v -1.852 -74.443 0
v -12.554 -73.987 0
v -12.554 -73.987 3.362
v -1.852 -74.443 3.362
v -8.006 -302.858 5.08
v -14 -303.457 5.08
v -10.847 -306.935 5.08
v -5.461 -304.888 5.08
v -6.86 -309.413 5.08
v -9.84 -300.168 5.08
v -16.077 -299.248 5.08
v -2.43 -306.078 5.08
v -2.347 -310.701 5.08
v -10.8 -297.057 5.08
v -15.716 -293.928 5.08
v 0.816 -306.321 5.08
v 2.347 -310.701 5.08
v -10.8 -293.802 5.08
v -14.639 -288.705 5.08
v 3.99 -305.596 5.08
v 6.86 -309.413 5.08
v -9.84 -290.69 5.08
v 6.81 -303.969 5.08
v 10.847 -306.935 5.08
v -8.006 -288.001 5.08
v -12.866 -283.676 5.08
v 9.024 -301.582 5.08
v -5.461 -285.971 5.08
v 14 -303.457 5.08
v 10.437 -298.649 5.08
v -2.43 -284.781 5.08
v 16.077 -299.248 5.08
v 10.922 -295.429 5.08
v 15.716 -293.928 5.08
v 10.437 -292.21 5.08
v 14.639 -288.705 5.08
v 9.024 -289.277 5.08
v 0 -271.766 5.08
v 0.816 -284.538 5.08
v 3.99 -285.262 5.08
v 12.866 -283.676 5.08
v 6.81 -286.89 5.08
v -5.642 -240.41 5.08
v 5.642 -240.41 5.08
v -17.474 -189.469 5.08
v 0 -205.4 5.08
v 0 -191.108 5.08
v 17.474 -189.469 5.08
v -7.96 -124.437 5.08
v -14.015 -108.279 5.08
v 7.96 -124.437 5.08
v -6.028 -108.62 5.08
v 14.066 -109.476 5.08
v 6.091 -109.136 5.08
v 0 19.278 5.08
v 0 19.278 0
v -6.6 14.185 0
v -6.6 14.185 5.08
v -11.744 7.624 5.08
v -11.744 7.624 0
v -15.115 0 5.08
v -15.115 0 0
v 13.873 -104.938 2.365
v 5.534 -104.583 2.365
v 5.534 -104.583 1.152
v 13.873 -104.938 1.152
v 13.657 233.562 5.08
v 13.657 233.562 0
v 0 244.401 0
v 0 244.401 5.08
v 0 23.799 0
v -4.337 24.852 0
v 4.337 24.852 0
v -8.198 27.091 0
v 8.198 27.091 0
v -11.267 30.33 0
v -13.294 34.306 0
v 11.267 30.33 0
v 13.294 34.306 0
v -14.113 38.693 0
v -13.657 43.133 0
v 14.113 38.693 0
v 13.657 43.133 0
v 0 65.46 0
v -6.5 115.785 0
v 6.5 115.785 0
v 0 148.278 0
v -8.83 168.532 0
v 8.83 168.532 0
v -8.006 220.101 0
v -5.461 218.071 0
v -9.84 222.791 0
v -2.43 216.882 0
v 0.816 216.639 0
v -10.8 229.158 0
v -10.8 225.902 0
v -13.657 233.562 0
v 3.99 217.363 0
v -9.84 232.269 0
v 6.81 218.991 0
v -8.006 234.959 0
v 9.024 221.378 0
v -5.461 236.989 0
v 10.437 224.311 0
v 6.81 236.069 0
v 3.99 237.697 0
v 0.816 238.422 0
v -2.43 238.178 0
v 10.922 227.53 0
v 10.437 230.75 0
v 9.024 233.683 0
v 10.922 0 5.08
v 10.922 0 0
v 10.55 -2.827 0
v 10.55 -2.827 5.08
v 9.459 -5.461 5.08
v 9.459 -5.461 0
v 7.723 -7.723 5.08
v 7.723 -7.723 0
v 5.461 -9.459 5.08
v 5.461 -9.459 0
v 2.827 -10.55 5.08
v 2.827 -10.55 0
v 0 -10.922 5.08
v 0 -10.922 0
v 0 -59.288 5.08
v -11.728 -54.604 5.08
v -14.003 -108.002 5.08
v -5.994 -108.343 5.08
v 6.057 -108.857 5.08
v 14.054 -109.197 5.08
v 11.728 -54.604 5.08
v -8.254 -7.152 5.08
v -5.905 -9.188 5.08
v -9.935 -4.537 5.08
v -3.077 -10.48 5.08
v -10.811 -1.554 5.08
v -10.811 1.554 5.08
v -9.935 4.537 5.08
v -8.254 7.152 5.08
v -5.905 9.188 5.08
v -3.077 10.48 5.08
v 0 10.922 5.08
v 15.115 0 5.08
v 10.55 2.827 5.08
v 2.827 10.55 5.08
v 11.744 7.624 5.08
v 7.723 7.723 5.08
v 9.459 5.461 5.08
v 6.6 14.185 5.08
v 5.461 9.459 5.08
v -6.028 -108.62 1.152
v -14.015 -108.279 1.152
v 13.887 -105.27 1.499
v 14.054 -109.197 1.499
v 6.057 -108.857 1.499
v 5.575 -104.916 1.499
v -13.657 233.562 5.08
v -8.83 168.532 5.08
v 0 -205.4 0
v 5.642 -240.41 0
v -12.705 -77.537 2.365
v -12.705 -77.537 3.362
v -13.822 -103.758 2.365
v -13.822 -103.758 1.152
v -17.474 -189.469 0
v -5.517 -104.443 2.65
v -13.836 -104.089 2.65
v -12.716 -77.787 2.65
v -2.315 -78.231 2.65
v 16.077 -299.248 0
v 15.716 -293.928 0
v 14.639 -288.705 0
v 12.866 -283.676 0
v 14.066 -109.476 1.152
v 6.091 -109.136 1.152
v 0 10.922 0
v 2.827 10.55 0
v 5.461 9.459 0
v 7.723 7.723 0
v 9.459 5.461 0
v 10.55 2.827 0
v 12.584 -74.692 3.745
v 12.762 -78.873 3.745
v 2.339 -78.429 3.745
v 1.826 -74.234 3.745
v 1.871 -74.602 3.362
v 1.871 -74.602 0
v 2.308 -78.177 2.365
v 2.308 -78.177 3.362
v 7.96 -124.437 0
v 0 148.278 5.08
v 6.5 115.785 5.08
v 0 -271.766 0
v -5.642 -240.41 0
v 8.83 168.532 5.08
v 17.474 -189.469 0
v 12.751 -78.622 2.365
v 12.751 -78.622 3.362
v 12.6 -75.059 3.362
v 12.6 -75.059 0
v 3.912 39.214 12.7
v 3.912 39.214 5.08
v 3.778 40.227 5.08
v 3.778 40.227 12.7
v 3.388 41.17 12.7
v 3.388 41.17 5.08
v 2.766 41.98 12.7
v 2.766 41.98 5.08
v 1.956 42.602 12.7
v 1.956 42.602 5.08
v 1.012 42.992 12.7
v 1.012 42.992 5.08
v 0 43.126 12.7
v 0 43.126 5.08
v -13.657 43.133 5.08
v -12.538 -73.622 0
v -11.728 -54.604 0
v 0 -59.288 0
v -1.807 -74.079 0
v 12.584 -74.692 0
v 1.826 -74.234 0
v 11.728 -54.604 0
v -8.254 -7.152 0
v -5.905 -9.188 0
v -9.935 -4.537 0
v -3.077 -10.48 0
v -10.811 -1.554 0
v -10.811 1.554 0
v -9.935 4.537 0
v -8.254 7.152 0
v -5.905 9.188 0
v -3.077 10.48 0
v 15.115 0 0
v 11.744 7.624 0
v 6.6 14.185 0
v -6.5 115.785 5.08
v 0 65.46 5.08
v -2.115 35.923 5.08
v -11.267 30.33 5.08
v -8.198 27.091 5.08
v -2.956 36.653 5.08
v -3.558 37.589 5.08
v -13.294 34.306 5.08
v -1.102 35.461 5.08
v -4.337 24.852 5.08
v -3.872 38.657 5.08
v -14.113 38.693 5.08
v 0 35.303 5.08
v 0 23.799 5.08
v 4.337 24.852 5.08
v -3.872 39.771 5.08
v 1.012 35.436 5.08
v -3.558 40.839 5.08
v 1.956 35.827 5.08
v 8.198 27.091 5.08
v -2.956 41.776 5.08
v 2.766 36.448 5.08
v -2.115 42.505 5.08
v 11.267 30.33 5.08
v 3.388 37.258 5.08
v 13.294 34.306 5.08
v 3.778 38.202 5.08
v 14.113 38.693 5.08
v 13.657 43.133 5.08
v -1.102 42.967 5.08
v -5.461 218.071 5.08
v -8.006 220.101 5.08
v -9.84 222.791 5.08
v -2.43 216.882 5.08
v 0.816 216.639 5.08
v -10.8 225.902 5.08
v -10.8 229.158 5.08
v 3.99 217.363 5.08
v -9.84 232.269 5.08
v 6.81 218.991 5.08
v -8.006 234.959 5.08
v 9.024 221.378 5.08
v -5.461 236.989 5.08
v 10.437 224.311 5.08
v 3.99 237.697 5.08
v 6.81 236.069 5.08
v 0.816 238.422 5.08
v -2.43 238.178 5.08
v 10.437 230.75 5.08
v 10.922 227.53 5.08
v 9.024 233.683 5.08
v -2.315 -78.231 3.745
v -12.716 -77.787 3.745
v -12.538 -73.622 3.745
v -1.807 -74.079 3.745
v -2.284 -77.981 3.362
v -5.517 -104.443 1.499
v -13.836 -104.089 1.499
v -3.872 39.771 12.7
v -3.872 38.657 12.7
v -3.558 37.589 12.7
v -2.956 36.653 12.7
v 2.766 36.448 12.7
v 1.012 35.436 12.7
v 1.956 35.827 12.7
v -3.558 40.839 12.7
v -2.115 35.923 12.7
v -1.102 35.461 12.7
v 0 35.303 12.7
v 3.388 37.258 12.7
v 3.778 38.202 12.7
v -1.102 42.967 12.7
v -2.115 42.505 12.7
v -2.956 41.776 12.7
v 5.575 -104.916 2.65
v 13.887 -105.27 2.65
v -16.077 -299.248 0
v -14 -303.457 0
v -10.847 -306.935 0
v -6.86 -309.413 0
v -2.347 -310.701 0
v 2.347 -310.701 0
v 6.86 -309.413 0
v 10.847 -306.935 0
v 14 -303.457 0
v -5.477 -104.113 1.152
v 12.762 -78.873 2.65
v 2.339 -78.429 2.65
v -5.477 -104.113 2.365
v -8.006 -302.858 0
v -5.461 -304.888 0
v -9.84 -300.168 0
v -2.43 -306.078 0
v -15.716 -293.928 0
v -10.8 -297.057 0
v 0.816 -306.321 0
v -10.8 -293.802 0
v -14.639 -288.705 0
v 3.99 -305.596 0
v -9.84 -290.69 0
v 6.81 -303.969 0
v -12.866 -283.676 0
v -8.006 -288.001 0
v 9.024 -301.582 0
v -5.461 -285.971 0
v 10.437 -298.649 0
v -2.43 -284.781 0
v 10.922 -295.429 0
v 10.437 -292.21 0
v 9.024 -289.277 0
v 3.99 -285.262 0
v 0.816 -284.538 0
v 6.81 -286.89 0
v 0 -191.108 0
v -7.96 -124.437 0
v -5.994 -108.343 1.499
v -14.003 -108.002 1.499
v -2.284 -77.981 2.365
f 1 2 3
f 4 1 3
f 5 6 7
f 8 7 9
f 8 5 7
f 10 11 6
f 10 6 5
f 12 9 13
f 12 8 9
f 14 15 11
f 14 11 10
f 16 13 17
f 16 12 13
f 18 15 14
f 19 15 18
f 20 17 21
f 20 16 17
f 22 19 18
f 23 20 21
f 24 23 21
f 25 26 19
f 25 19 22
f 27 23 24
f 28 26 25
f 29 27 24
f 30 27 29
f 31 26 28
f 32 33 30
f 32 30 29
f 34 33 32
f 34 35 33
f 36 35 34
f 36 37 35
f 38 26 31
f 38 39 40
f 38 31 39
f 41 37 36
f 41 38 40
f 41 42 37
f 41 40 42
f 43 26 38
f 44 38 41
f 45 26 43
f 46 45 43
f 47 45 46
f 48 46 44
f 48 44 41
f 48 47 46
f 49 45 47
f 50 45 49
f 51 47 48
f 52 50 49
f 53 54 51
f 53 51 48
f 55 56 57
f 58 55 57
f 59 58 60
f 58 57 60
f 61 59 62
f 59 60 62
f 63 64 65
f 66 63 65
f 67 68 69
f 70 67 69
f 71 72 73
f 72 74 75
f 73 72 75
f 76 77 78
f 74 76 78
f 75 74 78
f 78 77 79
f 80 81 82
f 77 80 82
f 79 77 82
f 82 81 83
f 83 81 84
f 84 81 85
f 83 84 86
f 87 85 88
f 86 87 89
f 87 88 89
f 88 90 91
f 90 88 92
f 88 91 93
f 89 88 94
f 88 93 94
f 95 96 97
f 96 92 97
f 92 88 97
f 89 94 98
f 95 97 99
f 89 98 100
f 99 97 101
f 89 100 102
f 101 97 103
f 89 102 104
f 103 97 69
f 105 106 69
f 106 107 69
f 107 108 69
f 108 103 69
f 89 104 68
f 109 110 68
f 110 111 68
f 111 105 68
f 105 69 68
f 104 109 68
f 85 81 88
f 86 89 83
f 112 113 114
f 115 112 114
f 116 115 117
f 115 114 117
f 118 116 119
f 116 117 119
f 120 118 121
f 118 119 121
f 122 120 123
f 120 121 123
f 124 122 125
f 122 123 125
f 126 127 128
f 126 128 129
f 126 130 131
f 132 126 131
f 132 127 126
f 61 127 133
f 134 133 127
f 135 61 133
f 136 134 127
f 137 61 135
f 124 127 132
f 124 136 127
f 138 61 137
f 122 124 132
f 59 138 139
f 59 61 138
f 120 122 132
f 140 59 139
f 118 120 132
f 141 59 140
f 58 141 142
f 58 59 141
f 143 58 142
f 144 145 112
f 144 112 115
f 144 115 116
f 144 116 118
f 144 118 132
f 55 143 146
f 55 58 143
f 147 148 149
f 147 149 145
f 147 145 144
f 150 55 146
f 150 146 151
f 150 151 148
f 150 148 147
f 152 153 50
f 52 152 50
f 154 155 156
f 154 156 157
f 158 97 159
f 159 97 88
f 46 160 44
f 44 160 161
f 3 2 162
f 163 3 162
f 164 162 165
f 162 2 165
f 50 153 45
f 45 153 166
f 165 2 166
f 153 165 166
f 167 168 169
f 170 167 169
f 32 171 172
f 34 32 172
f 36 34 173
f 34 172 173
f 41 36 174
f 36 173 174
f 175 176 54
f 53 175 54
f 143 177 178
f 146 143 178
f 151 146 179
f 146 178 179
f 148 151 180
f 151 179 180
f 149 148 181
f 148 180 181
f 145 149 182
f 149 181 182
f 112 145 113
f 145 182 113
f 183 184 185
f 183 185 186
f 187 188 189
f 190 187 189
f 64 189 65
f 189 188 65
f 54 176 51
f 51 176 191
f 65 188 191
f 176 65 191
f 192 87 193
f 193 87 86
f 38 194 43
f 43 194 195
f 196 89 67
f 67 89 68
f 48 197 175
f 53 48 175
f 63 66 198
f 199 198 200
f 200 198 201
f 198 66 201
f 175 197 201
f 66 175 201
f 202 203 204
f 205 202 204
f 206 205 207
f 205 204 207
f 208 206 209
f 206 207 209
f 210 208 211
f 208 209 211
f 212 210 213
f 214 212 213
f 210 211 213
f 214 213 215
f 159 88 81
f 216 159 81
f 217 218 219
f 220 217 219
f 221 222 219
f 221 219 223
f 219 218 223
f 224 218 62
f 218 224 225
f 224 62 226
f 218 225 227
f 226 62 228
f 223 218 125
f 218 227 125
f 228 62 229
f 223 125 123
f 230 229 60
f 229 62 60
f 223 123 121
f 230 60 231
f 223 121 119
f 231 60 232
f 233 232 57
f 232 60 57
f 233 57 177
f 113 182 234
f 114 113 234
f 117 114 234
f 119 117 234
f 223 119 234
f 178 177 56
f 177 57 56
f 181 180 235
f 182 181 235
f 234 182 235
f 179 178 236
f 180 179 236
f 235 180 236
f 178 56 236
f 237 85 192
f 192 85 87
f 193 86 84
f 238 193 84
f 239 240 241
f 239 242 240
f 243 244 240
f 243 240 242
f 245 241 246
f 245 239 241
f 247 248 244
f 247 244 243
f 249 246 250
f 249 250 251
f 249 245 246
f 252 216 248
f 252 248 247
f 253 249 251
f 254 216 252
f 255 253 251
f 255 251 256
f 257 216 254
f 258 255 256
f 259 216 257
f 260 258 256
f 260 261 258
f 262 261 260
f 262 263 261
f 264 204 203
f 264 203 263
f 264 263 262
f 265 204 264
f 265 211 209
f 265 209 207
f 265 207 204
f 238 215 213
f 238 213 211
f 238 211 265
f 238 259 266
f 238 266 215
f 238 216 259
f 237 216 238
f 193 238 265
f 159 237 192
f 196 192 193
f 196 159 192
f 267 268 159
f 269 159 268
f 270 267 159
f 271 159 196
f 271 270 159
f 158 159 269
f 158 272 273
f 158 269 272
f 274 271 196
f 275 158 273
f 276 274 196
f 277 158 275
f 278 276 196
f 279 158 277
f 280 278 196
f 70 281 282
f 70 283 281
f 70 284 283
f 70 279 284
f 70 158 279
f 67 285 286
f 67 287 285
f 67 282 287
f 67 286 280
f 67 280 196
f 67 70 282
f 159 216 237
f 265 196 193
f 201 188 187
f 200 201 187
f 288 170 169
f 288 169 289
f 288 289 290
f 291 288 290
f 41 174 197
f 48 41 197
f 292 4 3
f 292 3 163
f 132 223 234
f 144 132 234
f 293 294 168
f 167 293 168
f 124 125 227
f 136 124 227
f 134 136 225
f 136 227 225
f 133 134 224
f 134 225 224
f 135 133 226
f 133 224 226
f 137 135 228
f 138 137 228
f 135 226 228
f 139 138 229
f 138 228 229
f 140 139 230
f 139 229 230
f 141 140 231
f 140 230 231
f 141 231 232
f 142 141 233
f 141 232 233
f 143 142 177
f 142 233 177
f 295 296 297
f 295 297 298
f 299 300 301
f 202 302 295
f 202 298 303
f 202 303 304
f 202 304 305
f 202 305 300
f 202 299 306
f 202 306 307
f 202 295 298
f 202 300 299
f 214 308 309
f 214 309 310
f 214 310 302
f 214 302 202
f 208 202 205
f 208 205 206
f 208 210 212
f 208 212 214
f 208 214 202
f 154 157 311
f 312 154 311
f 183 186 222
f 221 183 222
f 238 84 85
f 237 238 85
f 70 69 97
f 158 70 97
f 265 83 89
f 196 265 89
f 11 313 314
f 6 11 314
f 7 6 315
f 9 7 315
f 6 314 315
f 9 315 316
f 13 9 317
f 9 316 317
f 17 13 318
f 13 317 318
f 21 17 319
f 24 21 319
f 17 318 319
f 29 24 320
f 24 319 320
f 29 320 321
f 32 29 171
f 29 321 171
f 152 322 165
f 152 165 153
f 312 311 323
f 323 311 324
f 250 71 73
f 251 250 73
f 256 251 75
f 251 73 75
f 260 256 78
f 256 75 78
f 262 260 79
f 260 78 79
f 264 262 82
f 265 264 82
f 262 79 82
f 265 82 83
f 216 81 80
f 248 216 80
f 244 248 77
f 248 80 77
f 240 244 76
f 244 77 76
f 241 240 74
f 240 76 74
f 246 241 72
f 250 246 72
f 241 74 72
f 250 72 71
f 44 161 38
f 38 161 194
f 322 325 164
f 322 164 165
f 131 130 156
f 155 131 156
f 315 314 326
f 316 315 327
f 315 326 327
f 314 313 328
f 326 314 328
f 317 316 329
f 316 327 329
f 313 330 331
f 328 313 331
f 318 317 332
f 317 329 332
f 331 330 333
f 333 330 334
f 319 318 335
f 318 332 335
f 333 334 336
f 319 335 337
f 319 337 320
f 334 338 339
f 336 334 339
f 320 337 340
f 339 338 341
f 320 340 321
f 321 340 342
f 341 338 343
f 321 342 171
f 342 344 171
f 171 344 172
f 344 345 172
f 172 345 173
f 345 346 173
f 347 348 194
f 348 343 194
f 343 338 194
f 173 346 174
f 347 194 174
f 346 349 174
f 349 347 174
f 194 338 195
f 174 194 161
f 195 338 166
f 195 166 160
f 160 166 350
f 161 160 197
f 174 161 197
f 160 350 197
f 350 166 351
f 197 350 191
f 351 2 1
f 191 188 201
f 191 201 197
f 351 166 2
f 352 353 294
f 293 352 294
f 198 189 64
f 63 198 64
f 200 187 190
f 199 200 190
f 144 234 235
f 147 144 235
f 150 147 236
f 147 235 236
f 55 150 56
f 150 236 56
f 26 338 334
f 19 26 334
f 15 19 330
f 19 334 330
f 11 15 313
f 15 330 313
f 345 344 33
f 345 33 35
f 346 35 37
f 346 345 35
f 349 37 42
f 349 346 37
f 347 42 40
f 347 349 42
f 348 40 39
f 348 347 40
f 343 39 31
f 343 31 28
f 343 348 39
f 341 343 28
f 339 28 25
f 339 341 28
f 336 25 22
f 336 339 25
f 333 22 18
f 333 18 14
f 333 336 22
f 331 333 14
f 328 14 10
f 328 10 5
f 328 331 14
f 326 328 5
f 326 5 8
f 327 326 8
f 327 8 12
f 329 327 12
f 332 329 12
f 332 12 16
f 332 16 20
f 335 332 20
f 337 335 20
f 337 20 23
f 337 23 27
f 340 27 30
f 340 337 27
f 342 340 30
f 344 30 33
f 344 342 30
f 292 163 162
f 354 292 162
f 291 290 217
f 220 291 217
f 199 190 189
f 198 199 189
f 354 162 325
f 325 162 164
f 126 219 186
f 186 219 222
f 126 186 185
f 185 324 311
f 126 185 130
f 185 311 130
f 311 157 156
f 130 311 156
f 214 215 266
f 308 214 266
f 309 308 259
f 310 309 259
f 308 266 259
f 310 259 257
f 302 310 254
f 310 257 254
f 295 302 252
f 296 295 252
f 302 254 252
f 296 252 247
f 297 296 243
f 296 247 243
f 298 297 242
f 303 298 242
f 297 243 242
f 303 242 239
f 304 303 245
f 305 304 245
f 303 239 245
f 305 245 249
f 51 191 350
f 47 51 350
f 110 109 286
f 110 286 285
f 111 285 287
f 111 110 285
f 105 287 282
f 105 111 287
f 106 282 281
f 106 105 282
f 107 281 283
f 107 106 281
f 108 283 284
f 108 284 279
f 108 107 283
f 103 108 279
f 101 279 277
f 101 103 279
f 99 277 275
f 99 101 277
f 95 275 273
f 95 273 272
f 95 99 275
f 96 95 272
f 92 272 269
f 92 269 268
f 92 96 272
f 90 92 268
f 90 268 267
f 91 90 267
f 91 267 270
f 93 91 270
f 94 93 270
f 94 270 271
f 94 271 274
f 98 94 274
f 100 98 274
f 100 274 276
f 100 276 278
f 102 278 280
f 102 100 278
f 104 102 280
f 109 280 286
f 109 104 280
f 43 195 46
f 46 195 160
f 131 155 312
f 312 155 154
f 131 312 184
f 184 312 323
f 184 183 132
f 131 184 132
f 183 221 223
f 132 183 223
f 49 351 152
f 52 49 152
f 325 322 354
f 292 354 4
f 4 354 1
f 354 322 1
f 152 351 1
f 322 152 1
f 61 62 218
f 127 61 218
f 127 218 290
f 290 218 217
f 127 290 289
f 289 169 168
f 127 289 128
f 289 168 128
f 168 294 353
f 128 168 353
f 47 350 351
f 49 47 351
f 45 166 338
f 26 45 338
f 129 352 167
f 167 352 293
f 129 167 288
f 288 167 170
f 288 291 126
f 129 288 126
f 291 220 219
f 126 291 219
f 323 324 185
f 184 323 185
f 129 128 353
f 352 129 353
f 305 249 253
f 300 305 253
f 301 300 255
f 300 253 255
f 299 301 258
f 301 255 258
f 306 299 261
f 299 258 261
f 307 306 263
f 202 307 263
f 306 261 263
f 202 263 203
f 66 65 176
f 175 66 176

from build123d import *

# Parameters (mm, degrees)
F0_R       = 10.922
F1_DEPTH   = 5.08
F3_R       = 10.922
F4_DEPTH   = 5.08
F5_DEPTH   = 12.7
F1_FACE1_W = 134.9867132481
F1_FACE1_H = 5.08
F6_DEPTH   = 40.0849549569


with BuildPart() as f1:
    # F0 (on Top) → F1 (new body)
    with BuildSketch(Plane.XY):
        with BuildLine():
            ThreePointArc((15.1150114834, 0), (9.3757520306, 11.0647871917), (0, 19.278427586))
            ThreePointArc((0, 19.278427586), (-9.3757520306, 11.0647871917), (-15.1150114834, 0))
            Line((-15.1150114834, 0), (-11.728124693, -54.6044968069))
            Line((-11.728124693, -54.6044968069), (-17.4740906805, -189.4688606262))
            Line((-17.4740906805, -189.4688606262), (-12.8661198542, -283.6762070656))
            ThreePointArc((-12.8661198542, -283.6762070656), (-15.2657067928, -291.2982501834), (-16.0767073593, -299.2478311062))
            ThreePointArc((-16.0767073593, -299.2478311062), (0, -310.8648259444), (16.0767073593, -299.2478311062))
            ThreePointArc((16.0767073593, -299.2478311062), (15.2657067928, -291.2982501834), (12.8661198542, -283.6762070656))
            Line((12.8661198542, -283.6762070656), (17.4740906805, -189.4688606262))
            Line((17.4740906805, -189.4688606262), (11.728124693, -54.6044968069))
            Line((11.728124693, -54.6044968069), (15.1150114834, 0))
        make_face()
        with Locations((0, -295.4293489456)):
            Circle(F0_R, mode=Mode.SUBTRACT)
        Polygon((-5.6423097849, -240.4096722603), (0, -205.3996622562), (5.6423097849, -240.4096722603), (0, -271.7664837837), align=None, mode=Mode.SUBTRACT)
        Polygon((-7.9602571204, -124.4369074702), (0, -59.2878311872), (7.9602571204, -124.4369074702), (0, -191.1081522703), align=None, mode=Mode.SUBTRACT)
        with BuildLine():
            ThreePointArc((0, 10.922), (7.7230202641, 7.7230202641), (10.922, 0))
            ThreePointArc((10.922, 0), (7.7230202641, -7.7230202641), (0, -10.922))
            ThreePointArc((0, -10.922), (-10.922, 0), (0, 10.922))
        make_face(mode=Mode.SUBTRACT)
    extrude(amount=F1_DEPTH)

    # F2 (on face) + F1_face1 (on face) → F6 (cut, through all)
    with BuildSketch(Plane(origin=(-9.3846365842, 0.3998372965, 0), x_dir=(-0.0425669005, -0.9990936187, 0), z_dir=(-0.9990936187, 0.0425669005, 0))):
        Polygon((108.6390390992, 5.08), (108.5000261664, 5.08), (108.5000261664, 1.4986022143), (104.5833975077, 1.4986022143), (104.5833975077, 2.6502343826), (78.2581716776, 2.6502343826), (78.2581716776, 3.7448140793), (74.0887746215, 3.7448140793), (74.0887746215, 0), (74.304997921, 0), (74.4544714689, 0), (74.4544714689, 3.3619990572), (78.0077949166, 3.3619990572), (78.0077949166, 2.3651611991), (104.2522341013, 2.3651611991), (104.2522341013, 1.1519507971), (108.777731657, 1.1519507971), (108.777731657, 5.08), align=None)
    with BuildSketch(Plane(origin=(14.6011076868, -122.0366787165, 2.54), x_dir=(-0.0425669005, 0.9990936187, 0), z_dir=(0.9990936187, 0.0425669005, 0))):
        Rectangle(F1_FACE1_W, F1_FACE1_H)
    extrude(amount=-F6_DEPTH, dir=(-0.9990936187, 0.0425669005, 0), mode=Mode.SUBTRACT)


with BuildPart() as f4:
    # F3 (on Top) → F4 (new body)
    with BuildSketch(Plane.XY):
        with BuildLine():
            Line((-8.8296765462, 168.5318052769), (-13.6566273868, 43.1325063109))
            ThreePointArc((-13.6566273868, 43.1325063109), (-11.2673867399, 30.3300555363), (0, 23.7988065928))
            ThreePointArc((0, 23.7988065928), (11.2673867399, 30.3300555363), (13.6566273868, 43.1325063109))
            Line((13.6566273868, 43.1325063109), (8.8296765462, 168.5318052769))
            Line((8.8296765462, 168.5318052769), (13.6566273868, 233.5623651743))
            Line((13.6566273868, 233.5623651743), (0, 244.4007992744))
            Line((0, 244.4007992744), (-13.6566273868, 233.5623651743))
            Line((-13.6566273868, 233.5623651743), (-8.8296765462, 168.5318052769))
        make_face()
        with BuildLine():
            ThreePointArc((3.9116, 39.2141240993), (2.7659188853, 36.448205214), (0, 35.3025240993))
            ThreePointArc((0, 35.3025240993), (-3.9116, 39.2141240993), (0, 43.1257240993))
            ThreePointArc((0, 43.1257240993), (2.7659188853, 41.9800429846), (3.9116, 39.2141240993))
        make_face(mode=Mode.SUBTRACT)
        Polygon((6.5004709177, 115.7847344875), (0, 65.4596313834), (-6.5004709177, 115.7847344875), (0, 148.2781022787), align=None, mode=Mode.SUBTRACT)
        with Locations((0, 227.5302112103)):
            Circle(F3_R, mode=Mode.SUBTRACT)
    extrude(amount=F4_DEPTH)

    # F3 (on Top) → F5 (join)
    with BuildSketch(Plane.XY):
        with BuildLine():
            ThreePointArc((0, 43.1257240993), (-3.9116, 39.2141240993), (0, 35.3025240993))
            Line((0, 35.3025240993), (0, 43.1257240993))
        make_face()
        with BuildLine():
            Line((0, 43.1257240993), (0, 35.3025240993))
            ThreePointArc((0, 35.3025240993), (2.7659188853, 36.448205214), (3.9116, 39.2141240993))
            ThreePointArc((3.9116, 39.2141240993), (2.7659188853, 41.9800429846), (0, 43.1257240993))
        make_face()
    extrude(amount=F5_DEPTH)


solid = Compound([f1.part, f4.part])
